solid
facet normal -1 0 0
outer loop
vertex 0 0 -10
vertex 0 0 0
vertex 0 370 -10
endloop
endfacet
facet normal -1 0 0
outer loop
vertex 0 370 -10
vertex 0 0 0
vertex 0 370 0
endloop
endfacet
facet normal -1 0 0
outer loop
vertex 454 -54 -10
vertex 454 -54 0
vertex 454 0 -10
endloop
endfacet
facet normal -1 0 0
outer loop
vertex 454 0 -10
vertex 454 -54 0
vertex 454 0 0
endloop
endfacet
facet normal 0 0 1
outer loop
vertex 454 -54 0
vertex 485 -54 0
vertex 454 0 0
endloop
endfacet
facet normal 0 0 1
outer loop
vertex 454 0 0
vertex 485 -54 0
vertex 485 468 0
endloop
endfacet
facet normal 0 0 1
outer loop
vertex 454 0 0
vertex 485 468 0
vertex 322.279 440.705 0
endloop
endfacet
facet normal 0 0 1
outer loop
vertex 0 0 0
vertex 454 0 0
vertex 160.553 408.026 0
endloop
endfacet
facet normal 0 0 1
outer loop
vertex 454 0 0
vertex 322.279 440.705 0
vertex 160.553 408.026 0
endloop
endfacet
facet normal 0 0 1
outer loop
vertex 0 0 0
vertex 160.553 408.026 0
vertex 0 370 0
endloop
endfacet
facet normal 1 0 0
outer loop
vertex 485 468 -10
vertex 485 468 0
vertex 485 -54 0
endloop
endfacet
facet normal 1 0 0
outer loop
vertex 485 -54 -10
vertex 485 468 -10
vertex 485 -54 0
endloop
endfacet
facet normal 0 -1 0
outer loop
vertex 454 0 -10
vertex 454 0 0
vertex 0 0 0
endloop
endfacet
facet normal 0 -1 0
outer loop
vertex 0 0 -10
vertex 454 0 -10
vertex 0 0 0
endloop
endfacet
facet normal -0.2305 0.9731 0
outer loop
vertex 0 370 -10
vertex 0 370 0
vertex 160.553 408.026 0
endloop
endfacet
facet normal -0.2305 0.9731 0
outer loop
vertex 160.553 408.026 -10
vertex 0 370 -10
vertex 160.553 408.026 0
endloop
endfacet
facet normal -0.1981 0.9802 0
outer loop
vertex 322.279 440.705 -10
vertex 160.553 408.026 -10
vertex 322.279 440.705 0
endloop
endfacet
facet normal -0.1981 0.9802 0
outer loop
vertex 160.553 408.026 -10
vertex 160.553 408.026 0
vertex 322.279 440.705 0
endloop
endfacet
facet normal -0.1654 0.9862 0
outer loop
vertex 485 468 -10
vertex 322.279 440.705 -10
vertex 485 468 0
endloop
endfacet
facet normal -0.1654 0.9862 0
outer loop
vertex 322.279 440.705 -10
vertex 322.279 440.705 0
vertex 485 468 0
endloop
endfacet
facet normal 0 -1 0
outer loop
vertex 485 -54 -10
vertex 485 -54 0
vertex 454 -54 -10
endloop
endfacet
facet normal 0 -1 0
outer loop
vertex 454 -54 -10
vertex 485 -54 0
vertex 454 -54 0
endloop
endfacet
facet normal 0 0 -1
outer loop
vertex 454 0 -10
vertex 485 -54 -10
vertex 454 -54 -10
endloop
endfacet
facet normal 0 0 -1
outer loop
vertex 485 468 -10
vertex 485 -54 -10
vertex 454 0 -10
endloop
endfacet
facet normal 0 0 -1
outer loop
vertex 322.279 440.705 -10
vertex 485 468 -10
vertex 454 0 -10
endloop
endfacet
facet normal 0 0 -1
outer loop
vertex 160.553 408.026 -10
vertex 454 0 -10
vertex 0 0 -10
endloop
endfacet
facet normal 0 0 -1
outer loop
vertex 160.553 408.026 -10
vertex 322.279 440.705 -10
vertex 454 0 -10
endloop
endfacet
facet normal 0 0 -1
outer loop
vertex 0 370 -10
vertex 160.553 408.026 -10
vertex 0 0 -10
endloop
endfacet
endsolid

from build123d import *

# Parameters (mm, degrees)
TABAN_FLAN_1_DEPTH = 10


# Sheet-metal steps are written as plain solids
with BuildPart() as part:
    # Çizim1 → Taban-Flanş1 (new body)
    with BuildSketch(Plane.XY):
        with BuildLine():
            Line((0, 0), (0, 370))
            ThreePointArc((0, 370), (241.280287234, 425.036333585), (485, 468))
            Line((485, 468), (485, -54))
            Line((485, -54), (454, -54))
            Line((454, -54), (454, 0))
            Line((454, 0), (0, 0))
        make_face()
    extrude(amount=-TABAN_FLAN_1_DEPTH)


solid = part.part
